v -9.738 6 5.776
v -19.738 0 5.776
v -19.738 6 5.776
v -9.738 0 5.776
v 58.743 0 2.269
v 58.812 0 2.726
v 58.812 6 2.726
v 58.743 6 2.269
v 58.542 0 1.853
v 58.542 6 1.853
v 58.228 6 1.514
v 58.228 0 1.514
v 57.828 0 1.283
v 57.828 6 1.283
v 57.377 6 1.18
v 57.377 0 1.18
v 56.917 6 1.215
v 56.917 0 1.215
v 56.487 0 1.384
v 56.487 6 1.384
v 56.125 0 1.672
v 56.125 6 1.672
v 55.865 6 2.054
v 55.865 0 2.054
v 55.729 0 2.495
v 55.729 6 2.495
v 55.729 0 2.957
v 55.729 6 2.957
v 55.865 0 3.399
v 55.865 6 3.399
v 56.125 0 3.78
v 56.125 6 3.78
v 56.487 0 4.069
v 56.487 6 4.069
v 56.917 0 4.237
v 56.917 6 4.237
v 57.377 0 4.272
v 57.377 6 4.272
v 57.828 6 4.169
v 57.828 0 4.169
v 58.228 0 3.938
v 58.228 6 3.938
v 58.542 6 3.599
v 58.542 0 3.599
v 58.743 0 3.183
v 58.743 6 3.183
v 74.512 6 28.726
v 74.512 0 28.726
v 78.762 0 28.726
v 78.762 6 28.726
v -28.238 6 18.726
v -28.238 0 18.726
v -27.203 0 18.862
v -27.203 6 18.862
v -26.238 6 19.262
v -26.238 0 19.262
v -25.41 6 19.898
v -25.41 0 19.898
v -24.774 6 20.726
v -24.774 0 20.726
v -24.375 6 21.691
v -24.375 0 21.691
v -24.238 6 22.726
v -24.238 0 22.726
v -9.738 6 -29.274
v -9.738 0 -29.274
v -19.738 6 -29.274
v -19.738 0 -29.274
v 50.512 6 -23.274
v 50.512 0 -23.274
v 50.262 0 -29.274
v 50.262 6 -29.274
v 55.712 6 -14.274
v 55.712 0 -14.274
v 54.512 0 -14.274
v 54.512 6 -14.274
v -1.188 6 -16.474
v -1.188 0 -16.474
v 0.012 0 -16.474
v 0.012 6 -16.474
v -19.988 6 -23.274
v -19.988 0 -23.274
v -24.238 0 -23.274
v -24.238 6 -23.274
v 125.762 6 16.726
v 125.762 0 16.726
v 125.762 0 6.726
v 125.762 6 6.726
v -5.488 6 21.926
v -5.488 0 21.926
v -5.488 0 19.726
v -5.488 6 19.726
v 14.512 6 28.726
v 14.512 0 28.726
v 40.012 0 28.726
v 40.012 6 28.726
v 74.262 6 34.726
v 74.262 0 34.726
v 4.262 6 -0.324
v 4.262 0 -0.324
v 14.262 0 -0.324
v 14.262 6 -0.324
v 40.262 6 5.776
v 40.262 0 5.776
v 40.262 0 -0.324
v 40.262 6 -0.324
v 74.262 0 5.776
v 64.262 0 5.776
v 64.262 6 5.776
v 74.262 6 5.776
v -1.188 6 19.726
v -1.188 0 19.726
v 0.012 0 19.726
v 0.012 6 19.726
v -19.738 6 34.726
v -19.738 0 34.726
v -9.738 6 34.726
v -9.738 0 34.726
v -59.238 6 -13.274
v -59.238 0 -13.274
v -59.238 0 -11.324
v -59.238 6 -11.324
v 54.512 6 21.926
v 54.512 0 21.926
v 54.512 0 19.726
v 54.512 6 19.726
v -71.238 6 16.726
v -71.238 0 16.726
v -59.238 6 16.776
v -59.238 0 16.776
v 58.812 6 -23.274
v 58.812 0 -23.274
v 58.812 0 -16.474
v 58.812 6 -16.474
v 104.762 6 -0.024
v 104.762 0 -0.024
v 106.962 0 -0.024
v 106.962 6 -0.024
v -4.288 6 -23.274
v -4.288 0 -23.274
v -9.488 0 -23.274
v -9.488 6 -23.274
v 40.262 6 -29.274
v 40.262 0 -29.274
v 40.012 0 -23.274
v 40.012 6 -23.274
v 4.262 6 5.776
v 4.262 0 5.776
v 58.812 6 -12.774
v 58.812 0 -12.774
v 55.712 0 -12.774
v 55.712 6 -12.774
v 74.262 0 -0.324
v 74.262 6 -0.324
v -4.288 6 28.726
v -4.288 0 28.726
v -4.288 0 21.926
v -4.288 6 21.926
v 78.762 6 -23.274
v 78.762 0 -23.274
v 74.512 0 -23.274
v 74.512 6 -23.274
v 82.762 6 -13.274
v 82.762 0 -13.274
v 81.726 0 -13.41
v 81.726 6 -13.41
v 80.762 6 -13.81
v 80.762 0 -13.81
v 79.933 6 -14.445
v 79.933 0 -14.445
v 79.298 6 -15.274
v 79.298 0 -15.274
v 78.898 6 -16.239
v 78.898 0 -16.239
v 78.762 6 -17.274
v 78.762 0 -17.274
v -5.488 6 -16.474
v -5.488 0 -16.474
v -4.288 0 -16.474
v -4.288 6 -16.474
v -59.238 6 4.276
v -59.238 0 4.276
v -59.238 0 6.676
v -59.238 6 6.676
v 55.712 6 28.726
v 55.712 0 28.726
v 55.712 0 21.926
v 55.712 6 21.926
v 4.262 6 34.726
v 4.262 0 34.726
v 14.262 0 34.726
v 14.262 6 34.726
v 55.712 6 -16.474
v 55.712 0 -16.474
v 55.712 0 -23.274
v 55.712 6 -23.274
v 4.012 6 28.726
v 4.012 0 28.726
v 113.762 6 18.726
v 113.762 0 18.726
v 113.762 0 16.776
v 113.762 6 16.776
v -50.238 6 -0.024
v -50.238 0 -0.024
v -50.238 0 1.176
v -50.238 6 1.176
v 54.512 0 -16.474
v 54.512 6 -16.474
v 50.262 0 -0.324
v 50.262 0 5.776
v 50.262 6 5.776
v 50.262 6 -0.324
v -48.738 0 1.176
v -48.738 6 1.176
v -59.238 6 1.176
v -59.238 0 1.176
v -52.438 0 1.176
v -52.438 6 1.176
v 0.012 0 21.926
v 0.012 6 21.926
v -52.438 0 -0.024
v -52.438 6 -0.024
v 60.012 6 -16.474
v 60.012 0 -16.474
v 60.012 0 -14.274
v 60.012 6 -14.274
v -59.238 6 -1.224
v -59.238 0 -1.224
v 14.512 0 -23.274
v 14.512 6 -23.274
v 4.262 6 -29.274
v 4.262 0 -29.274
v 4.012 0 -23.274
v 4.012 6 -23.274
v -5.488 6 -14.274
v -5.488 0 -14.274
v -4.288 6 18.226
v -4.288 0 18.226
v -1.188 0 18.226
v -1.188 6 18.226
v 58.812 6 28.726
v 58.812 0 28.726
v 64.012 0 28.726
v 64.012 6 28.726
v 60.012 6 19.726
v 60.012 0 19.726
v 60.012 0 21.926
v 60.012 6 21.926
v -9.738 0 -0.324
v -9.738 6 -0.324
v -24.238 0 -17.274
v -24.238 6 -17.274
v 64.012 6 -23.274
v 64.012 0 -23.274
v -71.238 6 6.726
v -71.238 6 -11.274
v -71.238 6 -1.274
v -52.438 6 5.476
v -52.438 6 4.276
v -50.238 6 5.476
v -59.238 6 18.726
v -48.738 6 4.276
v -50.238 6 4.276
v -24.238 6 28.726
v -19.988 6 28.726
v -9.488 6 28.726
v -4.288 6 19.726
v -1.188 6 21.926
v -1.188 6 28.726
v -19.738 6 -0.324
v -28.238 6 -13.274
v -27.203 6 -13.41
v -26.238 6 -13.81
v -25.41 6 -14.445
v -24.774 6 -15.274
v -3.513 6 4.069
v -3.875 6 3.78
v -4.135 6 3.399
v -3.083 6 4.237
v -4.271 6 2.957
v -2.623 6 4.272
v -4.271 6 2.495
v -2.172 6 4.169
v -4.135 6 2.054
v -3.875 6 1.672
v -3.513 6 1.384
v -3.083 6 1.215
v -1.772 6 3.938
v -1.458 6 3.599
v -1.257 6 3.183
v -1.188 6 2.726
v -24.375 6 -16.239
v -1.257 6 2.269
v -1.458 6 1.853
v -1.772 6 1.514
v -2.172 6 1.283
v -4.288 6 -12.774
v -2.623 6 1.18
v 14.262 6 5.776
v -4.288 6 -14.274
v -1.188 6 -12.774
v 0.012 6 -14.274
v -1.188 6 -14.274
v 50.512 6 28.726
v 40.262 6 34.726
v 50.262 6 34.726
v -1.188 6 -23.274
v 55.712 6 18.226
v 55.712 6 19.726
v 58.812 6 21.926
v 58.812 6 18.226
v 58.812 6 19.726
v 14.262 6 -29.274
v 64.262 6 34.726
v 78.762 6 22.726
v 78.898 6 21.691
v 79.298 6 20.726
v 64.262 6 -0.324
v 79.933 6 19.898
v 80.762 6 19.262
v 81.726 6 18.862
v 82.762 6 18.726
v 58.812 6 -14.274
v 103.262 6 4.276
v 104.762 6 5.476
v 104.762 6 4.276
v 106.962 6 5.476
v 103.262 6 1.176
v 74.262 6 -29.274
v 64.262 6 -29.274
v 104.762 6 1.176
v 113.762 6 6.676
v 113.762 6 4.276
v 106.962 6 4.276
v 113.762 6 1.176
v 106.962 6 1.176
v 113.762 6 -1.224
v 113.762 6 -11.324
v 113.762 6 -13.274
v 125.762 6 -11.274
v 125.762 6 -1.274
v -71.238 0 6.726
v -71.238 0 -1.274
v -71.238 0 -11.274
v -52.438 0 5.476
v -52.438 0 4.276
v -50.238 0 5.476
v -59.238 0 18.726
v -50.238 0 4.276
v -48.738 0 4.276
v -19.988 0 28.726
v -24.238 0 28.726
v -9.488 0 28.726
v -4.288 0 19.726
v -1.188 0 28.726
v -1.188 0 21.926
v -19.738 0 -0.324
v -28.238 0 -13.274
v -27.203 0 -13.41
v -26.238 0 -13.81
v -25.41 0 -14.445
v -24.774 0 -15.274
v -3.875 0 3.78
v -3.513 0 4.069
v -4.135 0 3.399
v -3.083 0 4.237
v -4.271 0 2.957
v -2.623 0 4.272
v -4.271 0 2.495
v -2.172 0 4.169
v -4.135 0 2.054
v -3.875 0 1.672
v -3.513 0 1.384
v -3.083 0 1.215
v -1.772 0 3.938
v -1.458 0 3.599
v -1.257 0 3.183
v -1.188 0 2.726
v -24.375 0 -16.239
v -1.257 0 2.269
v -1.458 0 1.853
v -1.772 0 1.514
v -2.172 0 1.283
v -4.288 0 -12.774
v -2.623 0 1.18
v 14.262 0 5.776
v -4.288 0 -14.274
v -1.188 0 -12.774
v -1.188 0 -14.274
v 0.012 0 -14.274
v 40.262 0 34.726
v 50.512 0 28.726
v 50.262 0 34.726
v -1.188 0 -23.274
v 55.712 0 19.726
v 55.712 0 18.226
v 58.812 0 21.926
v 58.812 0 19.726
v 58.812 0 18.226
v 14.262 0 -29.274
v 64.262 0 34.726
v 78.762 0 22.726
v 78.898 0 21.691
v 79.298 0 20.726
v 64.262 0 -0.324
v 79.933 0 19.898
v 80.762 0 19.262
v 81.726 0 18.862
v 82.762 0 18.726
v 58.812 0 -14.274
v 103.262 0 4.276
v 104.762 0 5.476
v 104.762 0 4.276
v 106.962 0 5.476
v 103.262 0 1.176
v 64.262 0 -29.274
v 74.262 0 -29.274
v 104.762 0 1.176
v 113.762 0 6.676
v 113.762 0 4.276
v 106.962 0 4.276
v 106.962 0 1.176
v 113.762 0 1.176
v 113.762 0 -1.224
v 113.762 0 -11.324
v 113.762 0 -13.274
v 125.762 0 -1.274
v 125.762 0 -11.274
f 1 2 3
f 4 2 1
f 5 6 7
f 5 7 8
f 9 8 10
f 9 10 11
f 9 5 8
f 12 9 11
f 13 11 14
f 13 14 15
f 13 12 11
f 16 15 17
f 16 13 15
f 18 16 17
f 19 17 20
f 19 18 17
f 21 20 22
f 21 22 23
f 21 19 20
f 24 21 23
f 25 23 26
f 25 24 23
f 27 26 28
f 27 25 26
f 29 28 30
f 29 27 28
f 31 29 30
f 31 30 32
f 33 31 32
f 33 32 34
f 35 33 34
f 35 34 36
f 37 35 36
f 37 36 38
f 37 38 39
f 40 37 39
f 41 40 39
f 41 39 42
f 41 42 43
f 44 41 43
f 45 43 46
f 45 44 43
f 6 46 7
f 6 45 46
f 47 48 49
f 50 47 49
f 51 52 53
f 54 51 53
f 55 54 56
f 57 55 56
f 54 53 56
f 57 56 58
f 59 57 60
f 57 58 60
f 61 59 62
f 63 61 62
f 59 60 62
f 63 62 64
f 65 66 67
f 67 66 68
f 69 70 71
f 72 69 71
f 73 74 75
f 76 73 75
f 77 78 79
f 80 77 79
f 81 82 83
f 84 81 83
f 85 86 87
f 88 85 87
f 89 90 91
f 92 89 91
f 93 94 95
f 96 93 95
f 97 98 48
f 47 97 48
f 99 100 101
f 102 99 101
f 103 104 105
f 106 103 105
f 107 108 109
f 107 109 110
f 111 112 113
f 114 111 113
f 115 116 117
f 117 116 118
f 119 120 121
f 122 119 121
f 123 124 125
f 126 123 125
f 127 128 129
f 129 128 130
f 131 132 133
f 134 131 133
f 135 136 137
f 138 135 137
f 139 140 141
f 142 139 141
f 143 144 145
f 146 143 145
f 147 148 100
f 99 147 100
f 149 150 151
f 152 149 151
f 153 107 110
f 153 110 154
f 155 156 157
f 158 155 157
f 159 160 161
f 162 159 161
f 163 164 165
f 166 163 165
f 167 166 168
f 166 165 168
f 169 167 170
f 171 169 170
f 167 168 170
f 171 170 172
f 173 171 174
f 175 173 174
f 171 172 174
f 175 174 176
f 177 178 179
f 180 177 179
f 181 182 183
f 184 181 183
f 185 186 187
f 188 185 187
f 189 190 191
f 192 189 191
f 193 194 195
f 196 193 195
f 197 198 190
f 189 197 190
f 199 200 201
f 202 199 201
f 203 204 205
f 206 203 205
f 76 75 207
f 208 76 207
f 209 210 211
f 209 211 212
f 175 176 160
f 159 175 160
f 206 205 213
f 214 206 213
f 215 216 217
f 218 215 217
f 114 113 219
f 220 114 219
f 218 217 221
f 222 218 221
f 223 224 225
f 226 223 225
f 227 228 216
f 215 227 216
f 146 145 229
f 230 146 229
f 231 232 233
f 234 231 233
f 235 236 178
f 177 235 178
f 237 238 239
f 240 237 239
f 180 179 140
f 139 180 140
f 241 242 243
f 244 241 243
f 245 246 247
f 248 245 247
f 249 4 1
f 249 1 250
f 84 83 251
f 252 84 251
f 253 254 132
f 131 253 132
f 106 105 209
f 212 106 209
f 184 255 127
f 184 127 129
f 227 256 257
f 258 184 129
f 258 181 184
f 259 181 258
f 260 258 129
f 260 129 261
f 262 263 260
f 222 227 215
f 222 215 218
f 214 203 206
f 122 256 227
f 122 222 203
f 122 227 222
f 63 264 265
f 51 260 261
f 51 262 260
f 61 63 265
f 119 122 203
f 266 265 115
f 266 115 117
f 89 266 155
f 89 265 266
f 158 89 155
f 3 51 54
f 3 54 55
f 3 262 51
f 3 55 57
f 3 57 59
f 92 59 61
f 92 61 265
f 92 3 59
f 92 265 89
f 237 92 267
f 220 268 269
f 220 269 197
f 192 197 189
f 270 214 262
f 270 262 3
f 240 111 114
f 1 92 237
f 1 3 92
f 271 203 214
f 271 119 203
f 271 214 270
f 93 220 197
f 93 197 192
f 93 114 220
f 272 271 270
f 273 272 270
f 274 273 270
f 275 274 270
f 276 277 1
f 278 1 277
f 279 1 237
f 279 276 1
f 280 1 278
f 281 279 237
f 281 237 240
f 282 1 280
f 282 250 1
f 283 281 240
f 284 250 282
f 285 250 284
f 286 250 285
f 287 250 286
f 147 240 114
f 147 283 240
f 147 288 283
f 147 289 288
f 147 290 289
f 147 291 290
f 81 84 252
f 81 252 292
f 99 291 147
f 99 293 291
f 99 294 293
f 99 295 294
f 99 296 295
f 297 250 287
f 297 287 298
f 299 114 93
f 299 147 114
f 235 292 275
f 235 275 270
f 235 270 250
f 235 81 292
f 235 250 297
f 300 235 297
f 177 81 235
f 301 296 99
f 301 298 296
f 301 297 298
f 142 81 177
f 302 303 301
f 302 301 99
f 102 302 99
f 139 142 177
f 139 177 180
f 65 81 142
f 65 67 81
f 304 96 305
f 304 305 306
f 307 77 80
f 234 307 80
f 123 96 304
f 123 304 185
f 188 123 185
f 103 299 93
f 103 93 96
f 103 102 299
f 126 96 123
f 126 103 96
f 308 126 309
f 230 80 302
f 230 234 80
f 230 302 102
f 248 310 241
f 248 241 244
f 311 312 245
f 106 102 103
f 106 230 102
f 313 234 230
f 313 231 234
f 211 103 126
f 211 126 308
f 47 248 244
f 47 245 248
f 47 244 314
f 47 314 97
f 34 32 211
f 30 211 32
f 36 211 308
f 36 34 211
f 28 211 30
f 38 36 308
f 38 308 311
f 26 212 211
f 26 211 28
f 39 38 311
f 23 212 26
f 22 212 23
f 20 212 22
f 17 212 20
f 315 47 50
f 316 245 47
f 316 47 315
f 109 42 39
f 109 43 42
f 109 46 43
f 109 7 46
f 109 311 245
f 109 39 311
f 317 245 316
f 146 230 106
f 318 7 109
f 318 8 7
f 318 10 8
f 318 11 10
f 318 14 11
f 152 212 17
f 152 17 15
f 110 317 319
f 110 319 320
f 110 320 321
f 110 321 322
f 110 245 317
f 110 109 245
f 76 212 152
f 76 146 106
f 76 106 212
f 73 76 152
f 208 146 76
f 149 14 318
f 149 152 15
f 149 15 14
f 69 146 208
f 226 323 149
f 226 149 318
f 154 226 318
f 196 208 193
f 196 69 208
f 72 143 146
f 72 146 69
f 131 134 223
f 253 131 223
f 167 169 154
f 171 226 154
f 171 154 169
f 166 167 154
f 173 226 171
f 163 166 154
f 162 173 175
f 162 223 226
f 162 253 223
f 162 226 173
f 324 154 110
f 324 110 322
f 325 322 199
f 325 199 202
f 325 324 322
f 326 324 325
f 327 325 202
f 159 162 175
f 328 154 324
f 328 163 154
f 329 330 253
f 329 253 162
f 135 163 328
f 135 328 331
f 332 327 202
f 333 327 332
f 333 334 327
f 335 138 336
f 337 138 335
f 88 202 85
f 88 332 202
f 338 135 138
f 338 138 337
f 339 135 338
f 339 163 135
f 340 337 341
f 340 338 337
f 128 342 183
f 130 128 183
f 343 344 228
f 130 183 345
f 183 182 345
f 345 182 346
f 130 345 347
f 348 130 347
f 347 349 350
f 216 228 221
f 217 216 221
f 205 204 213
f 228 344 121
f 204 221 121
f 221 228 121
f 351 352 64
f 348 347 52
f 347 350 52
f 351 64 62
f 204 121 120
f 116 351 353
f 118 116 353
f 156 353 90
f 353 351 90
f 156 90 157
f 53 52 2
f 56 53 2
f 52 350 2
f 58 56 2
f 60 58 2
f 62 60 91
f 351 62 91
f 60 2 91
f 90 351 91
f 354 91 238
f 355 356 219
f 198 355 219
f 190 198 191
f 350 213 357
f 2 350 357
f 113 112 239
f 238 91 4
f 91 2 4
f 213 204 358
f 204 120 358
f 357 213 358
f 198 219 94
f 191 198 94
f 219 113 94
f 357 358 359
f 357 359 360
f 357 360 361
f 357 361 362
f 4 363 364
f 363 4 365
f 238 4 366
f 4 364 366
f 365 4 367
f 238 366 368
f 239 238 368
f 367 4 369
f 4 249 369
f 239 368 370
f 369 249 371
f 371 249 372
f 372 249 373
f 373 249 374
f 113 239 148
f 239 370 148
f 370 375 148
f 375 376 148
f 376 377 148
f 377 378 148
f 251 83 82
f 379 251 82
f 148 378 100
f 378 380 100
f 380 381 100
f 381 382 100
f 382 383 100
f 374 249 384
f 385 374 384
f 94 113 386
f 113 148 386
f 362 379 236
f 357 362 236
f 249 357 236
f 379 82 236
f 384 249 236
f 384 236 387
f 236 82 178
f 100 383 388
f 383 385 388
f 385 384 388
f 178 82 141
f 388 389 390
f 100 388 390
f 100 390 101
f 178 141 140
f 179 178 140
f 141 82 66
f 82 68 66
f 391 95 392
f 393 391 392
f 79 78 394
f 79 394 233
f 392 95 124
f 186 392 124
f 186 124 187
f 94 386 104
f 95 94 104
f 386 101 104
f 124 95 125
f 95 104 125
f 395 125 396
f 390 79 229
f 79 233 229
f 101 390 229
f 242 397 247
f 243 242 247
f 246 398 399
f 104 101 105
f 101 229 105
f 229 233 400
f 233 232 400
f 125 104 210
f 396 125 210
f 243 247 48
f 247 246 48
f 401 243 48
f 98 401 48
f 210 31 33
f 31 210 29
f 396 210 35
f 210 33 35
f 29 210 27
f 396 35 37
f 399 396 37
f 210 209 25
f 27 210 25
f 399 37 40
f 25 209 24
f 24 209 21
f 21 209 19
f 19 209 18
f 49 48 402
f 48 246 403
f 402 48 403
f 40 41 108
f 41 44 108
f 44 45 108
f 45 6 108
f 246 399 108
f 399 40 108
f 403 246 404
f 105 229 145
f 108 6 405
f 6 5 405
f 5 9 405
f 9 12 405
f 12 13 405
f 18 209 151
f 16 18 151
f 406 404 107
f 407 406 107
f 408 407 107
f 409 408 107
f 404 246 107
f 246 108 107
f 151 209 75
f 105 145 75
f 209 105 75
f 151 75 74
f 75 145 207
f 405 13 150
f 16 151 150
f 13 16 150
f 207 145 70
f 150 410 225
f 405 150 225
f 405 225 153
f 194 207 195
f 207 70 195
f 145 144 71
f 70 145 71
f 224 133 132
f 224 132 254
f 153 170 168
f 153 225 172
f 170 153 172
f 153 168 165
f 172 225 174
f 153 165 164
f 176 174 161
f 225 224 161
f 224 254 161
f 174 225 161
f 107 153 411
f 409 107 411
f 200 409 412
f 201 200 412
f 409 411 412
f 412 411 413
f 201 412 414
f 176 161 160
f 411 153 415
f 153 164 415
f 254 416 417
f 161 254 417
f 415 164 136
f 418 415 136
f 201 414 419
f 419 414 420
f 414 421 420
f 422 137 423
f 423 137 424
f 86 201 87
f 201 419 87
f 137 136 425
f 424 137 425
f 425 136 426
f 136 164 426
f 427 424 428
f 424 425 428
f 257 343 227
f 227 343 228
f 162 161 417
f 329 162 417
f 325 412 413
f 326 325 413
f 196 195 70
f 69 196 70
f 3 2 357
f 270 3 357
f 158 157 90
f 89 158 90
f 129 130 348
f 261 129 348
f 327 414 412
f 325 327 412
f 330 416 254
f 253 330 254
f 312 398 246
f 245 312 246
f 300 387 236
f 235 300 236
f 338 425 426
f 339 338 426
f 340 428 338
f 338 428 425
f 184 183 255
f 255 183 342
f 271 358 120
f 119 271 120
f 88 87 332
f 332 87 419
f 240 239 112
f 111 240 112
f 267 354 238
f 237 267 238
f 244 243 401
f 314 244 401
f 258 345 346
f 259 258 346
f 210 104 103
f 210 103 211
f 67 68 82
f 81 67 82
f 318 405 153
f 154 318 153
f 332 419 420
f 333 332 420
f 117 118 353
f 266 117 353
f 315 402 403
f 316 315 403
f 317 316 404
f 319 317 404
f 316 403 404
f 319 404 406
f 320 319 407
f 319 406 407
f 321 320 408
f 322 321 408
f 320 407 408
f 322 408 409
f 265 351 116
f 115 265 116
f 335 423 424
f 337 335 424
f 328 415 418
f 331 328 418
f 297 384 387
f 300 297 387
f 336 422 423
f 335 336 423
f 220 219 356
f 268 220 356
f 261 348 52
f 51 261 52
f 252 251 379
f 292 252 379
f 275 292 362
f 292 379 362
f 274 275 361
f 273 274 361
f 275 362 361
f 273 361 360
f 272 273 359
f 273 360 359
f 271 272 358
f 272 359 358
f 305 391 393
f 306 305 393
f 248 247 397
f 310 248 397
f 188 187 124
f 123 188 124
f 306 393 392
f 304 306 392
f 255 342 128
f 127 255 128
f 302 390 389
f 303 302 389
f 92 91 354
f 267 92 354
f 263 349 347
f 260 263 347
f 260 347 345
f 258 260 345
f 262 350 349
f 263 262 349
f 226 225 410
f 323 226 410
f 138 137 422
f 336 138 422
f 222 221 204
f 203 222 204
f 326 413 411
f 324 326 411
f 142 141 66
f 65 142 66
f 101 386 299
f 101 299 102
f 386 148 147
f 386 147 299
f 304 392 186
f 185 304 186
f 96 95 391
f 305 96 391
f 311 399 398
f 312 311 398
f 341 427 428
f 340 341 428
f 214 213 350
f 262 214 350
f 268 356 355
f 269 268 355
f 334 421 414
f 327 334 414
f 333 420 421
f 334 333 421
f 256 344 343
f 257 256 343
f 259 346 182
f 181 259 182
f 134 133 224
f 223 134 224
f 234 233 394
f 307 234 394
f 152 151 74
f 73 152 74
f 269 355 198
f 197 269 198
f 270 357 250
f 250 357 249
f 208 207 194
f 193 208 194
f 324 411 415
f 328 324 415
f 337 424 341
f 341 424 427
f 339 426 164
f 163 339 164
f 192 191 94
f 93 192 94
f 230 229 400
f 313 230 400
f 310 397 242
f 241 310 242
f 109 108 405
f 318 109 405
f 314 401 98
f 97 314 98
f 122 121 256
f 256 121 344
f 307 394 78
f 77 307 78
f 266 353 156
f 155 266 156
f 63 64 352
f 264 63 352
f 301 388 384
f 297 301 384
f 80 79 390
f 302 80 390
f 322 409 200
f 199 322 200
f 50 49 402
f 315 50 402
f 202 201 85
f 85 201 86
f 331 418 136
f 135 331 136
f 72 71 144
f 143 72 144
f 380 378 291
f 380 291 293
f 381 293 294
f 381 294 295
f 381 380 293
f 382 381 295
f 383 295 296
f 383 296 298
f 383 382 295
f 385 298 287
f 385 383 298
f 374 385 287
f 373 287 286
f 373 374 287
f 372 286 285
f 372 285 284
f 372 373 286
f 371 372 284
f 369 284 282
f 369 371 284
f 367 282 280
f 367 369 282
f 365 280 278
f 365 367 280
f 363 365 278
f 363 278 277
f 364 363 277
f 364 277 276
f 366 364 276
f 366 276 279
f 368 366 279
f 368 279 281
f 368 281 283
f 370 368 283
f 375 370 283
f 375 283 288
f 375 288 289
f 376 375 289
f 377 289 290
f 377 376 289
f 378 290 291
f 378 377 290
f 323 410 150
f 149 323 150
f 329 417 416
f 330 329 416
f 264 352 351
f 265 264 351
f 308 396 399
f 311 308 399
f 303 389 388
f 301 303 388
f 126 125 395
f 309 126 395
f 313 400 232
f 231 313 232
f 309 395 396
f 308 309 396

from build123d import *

# Parameters (mm, degrees)
SKETCH_1_R      = 1.55
SKETCH_1_W      = 10
SKETCH_1_H      = 6.1
EXTRUDE_1_DEPTH = 6


with BuildPart() as part:
    # Эскиз1 → Бобышка-Вытянуть1 (new body)
    with BuildSketch(Plane(origin=(0, 0, 0), x_dir=(1, 0, 0), z_dir=(0, 1, 0))):
        with BuildLine():
            Line((40.261608154, 29.273839185), (40.011608154, 23.273839185))
            Line((40.011608154, 23.273839185), (14.511608154, 23.273839185))
            Line((14.511608154, 23.273839185), (14.261608154, 29.273839185))
            Line((14.261608154, 29.273839185), (4.261608154, 29.273839185))
            Line((4.261608154, 29.273839185), (4.011608154, 23.273839185))
            Line((4.011608154, 23.273839185), (-1.188391846, 23.273839185))
            Line((-1.188391846, 23.273839185), (-1.188391846, 16.473839185))
            Line((-1.188391846, 16.473839185), (0.011608154, 16.473839185))
            Line((0.011608154, 16.473839185), (0.011608154, 14.273839185))
            Line((0.011608154, 14.273839185), (-1.188391846, 14.273839185))
            Line((-1.188391846, 14.273839185), (-1.188391846, 12.773839185))
            Line((-1.188391846, 12.773839185), (-4.288391846, 12.773839185))
            Line((-4.288391846, 12.773839185), (-4.288391846, 14.273839185))
            Line((-4.288391846, 14.273839185), (-5.488391846, 14.273839185))
            Line((-5.488391846, 14.273839185), (-5.488391846, 16.473839185))
            Line((-5.488391846, 16.473839185), (-4.288391846, 16.473839185))
            Line((-4.288391846, 16.473839185), (-4.288391846, 23.273839185))
            Line((-4.288391846, 23.273839185), (-9.488391846, 23.273839185))
            Line((-9.488391846, 23.273839185), (-9.738391846, 29.273839185))
            Line((-9.738391846, 29.273839185), (-19.738391846, 29.273839185))
            Line((-19.738391846, 29.273839185), (-19.988391846, 23.273839185))
            Line((-19.988391846, 23.273839185), (-24.238391846, 23.273839185))
            Line((-24.238391846, 23.273839185), (-24.238391846, 17.273839185))
            ThreePointArc((-24.238391846, 17.273839185), (-25.409964721, 14.44541206), (-28.238391846, 13.273839185))
            Line((-28.238391846, 13.273839185), (-59.238391846, 13.273839185))
            Line((-59.238391846, 13.273839185), (-59.238391846, 11.323839185))
            Line((-59.238391846, 11.323839185), (-71.238391846, 11.273839185))
            Line((-71.238391846, 11.273839185), (-71.238391846, 1.273839185))
            Line((-71.238391846, 1.273839185), (-59.238391846, 1.223839185))
            Line((-59.238391846, 1.223839185), (-59.238391846, -1.176160815))
            Line((-59.238391846, -1.176160815), (-52.438391846, -1.176160815))
            Line((-52.438391846, -1.176160815), (-52.438391846, 0.023839185))
            Line((-52.438391846, 0.023839185), (-50.238391846, 0.023839185))
            Line((-50.238391846, 0.023839185), (-50.238391846, -1.176160815))
            Line((-50.238391846, -1.176160815), (-48.738391846, -1.176160815))
            Line((-48.738391846, -1.176160815), (-48.738391846, -4.276160815))
            Line((-48.738391846, -4.276160815), (-50.238391846, -4.276160815))
            Line((-50.238391846, -4.276160815), (-50.238391846, -5.476160815))
            Line((-50.238391846, -5.476160815), (-52.438391846, -5.476160815))
            Line((-52.438391846, -5.476160815), (-52.438391846, -4.276160815))
            Line((-52.438391846, -4.276160815), (-59.238391846, -4.276160815))
            Line((-59.238391846, -4.276160815), (-59.238391846, -6.676160815))
            Line((-59.238391846, -6.676160815), (-71.238391846, -6.726160815))
            Line((-71.238391846, -6.726160815), (-71.238391846, -16.726160815))
            Line((-71.238391846, -16.726160815), (-59.238391846, -16.776160815))
            Line((-59.238391846, -16.776160815), (-59.238391846, -18.726160815))
            Line((-59.238391846, -18.726160815), (-28.238391846, -18.726160815))
            ThreePointArc((-28.238391846, -18.726160815), (-25.409964721, -19.897733691), (-24.238391846, -22.726160815))
            Line((-24.238391846, -22.726160815), (-24.238391846, -28.726160815))
            Line((-24.238391846, -28.726160815), (-19.988391846, -28.726160815))
            Line((-19.988391846, -28.726160815), (-19.738391846, -34.726160815))
            Line((-19.738391846, -34.726160815), (-9.738391846, -34.726160815))
            Line((-9.738391846, -34.726160815), (-9.488391846, -28.726160815))
            Line((-9.488391846, -28.726160815), (-4.288391846, -28.726160815))
            Line((-4.288391846, -28.726160815), (-4.288391846, -21.926160815))
            Line((-4.288391846, -21.926160815), (-5.488391846, -21.926160815))
            Line((-5.488391846, -21.926160815), (-5.488391846, -19.726160815))
            Line((-5.488391846, -19.726160815), (-4.288391846, -19.726160815))
            Line((-4.288391846, -19.726160815), (-4.288391846, -18.226160815))
            Line((-4.288391846, -18.226160815), (-1.188391846, -18.226160815))
            Line((-1.188391846, -18.226160815), (-1.188391846, -19.726160815))
            Line((-1.188391846, -19.726160815), (0.011608154, -19.726160815))
            Line((0.011608154, -19.726160815), (0.011608154, -21.926160815))
            Line((0.011608154, -21.926160815), (-1.188391846, -21.926160815))
            Line((-1.188391846, -21.926160815), (-1.188391846, -28.726160815))
            Line((-1.188391846, -28.726160815), (4.011608154, -28.726160815))
            Line((4.011608154, -28.726160815), (4.261608154, -34.726160815))
            Line((4.261608154, -34.726160815), (14.261608154, -34.726160815))
            Line((14.261608154, -34.726160815), (14.511608154, -28.726160815))
            Line((14.511608154, -28.726160815), (40.011608154, -28.726160815))
            Line((40.011608154, -28.726160815), (40.261608154, -34.726160815))
            Line((40.261608154, -34.726160815), (50.261608154, -34.726160815))
            Line((50.261608154, -34.726160815), (50.511608154, -28.726160815))
            Line((50.511608154, -28.726160815), (55.711608154, -28.726160815))
            Line((55.711608154, -28.726160815), (55.711608154, -21.926160815))
            Line((55.711608154, -21.926160815), (54.511608154, -21.926160815))
            Line((54.511608154, -21.926160815), (54.511608154, -19.726160815))
            Line((54.511608154, -19.726160815), (55.711608154, -19.726160815))
            Line((55.711608154, -19.726160815), (55.711608154, -18.226160815))
            Line((55.711608154, -18.226160815), (58.811608154, -18.226160815))
            Line((58.811608154, -18.226160815), (58.811608154, -19.726160815))
            Line((58.811608154, -19.726160815), (60.011608154, -19.726160815))
            Line((60.011608154, -19.726160815), (60.011608154, -21.926160815))
            Line((60.011608154, -21.926160815), (58.811608154, -21.926160815))
            Line((58.811608154, -21.926160815), (58.811608154, -28.726160815))
            Line((58.811608154, -28.726160815), (64.011608154, -28.726160815))
            Line((64.011608154, -28.726160815), (64.261608154, -34.726160815))
            Line((64.261608154, -34.726160815), (74.261608154, -34.726160815))
            Line((74.261608154, -34.726160815), (74.511608154, -28.726160815))
            Line((74.511608154, -28.726160815), (78.761608154, -28.726160815))
            Line((78.761608154, -28.726160815), (78.761608154, -22.726160815))
            ThreePointArc((78.761608154, -22.726160815), (79.933181029, -19.897733691), (82.761608154, -18.726160815))
            Line((82.761608154, -18.726160815), (113.761608154, -18.726160815))
            Line((113.761608154, -18.726160815), (113.761608154, -16.776160815))
            Line((113.761608154, -16.776160815), (125.761608154, -16.726160815))
            Line((125.761608154, -16.726160815), (125.761608154, -6.726160815))
            Line((125.761608154, -6.726160815), (113.761608154, -6.676160815))
            Line((113.761608154, -6.676160815), (113.761608154, -4.276160815))
            Line((113.761608154, -4.276160815), (106.961608154, -4.276160815))
            Line((106.961608154, -4.276160815), (106.961608154, -5.476160815))
            Line((106.961608154, -5.476160815), (104.761608154, -5.476160815))
            Line((104.761608154, -5.476160815), (104.761608154, -4.276160815))
            Line((104.761608154, -4.276160815), (103.261608154, -4.276160815))
            Line((103.261608154, -4.276160815), (103.261608154, -1.176160815))
            Line((103.261608154, -1.176160815), (104.761608154, -1.176160815))
            Line((104.761608154, -1.176160815), (104.761608154, 0.023839185))
            Line((104.761608154, 0.023839185), (106.961608154, 0.023839185))
            Line((106.961608154, 0.023839185), (106.961608154, -1.176160815))
            Line((106.961608154, -1.176160815), (113.761608154, -1.176160815))
            Line((113.761608154, -1.176160815), (113.761608154, 1.223839185))
            Line((113.761608154, 1.223839185), (125.761608154, 1.273839185))
            Line((125.761608154, 1.273839185), (125.761608154, 11.273839185))
            Line((125.761608154, 11.273839185), (113.761608154, 11.323839185))
            Line((113.761608154, 11.323839185), (113.761608154, 13.273839185))
            Line((113.761608154, 13.273839185), (82.761608154, 13.273839185))
            ThreePointArc((82.761608154, 13.273839185), (79.933181029, 14.44541206), (78.761608154, 17.273839185))
            Line((78.761608154, 17.273839185), (78.761608154, 23.273839185))
            Line((78.761608154, 23.273839185), (74.511608154, 23.273839185))
            Line((74.511608154, 23.273839185), (74.261608154, 29.273839185))
            Line((74.261608154, 29.273839185), (64.261608154, 29.273839185))
            Line((64.261608154, 29.273839185), (64.011608154, 23.273839185))
            Line((64.011608154, 23.273839185), (58.811608154, 23.273839185))
            Line((58.811608154, 23.273839185), (58.811608154, 16.473839185))
            Line((58.811608154, 16.473839185), (60.011608154, 16.473839185))
            Line((60.011608154, 16.473839185), (60.011608154, 14.273839185))
            Line((60.011608154, 14.273839185), (58.811608154, 14.273839185))
            Line((58.811608154, 14.273839185), (58.811608154, 12.773839185))
            Line((58.811608154, 12.773839185), (55.711608154, 12.773839185))
            Line((55.711608154, 12.773839185), (55.711608154, 14.273839185))
            Line((55.711608154, 14.273839185), (54.511608154, 14.273839185))
            Line((54.511608154, 14.273839185), (54.511608154, 16.473839185))
            Line((54.511608154, 16.473839185), (55.711608154, 16.473839185))
            Line((55.711608154, 16.473839185), (55.711608154, 23.273839185))
            Line((55.711608154, 23.273839185), (50.511608154, 23.273839185))
            Line((50.511608154, 23.273839185), (50.261608154, 29.273839185))
            Line((50.261608154, 29.273839185), (40.261608154, 29.273839185))
        make_face()
        with Locations((-2.738391846, -2.726160815)):
            Circle(SKETCH_1_R, mode=Mode.SUBTRACT)
        with Locations((57.261608154, -2.726160815)):
            Circle(SKETCH_1_R, mode=Mode.SUBTRACT)
        with Locations((9.261608154, -2.726160815)):
            Rectangle(SKETCH_1_W, SKETCH_1_H, mode=Mode.SUBTRACT)
        with Locations((-14.738391846, -2.726160815)):
            Rectangle(SKETCH_1_W, SKETCH_1_H, mode=Mode.SUBTRACT)
        with Locations((45.261608154, -2.726160815)):
            Rectangle(SKETCH_1_W, SKETCH_1_H, mode=Mode.SUBTRACT)
        with Locations((69.261608154, -2.726160815)):
            Rectangle(SKETCH_1_W, SKETCH_1_H, mode=Mode.SUBTRACT)
    extrude(amount=EXTRUDE_1_DEPTH)


solid = part.part
